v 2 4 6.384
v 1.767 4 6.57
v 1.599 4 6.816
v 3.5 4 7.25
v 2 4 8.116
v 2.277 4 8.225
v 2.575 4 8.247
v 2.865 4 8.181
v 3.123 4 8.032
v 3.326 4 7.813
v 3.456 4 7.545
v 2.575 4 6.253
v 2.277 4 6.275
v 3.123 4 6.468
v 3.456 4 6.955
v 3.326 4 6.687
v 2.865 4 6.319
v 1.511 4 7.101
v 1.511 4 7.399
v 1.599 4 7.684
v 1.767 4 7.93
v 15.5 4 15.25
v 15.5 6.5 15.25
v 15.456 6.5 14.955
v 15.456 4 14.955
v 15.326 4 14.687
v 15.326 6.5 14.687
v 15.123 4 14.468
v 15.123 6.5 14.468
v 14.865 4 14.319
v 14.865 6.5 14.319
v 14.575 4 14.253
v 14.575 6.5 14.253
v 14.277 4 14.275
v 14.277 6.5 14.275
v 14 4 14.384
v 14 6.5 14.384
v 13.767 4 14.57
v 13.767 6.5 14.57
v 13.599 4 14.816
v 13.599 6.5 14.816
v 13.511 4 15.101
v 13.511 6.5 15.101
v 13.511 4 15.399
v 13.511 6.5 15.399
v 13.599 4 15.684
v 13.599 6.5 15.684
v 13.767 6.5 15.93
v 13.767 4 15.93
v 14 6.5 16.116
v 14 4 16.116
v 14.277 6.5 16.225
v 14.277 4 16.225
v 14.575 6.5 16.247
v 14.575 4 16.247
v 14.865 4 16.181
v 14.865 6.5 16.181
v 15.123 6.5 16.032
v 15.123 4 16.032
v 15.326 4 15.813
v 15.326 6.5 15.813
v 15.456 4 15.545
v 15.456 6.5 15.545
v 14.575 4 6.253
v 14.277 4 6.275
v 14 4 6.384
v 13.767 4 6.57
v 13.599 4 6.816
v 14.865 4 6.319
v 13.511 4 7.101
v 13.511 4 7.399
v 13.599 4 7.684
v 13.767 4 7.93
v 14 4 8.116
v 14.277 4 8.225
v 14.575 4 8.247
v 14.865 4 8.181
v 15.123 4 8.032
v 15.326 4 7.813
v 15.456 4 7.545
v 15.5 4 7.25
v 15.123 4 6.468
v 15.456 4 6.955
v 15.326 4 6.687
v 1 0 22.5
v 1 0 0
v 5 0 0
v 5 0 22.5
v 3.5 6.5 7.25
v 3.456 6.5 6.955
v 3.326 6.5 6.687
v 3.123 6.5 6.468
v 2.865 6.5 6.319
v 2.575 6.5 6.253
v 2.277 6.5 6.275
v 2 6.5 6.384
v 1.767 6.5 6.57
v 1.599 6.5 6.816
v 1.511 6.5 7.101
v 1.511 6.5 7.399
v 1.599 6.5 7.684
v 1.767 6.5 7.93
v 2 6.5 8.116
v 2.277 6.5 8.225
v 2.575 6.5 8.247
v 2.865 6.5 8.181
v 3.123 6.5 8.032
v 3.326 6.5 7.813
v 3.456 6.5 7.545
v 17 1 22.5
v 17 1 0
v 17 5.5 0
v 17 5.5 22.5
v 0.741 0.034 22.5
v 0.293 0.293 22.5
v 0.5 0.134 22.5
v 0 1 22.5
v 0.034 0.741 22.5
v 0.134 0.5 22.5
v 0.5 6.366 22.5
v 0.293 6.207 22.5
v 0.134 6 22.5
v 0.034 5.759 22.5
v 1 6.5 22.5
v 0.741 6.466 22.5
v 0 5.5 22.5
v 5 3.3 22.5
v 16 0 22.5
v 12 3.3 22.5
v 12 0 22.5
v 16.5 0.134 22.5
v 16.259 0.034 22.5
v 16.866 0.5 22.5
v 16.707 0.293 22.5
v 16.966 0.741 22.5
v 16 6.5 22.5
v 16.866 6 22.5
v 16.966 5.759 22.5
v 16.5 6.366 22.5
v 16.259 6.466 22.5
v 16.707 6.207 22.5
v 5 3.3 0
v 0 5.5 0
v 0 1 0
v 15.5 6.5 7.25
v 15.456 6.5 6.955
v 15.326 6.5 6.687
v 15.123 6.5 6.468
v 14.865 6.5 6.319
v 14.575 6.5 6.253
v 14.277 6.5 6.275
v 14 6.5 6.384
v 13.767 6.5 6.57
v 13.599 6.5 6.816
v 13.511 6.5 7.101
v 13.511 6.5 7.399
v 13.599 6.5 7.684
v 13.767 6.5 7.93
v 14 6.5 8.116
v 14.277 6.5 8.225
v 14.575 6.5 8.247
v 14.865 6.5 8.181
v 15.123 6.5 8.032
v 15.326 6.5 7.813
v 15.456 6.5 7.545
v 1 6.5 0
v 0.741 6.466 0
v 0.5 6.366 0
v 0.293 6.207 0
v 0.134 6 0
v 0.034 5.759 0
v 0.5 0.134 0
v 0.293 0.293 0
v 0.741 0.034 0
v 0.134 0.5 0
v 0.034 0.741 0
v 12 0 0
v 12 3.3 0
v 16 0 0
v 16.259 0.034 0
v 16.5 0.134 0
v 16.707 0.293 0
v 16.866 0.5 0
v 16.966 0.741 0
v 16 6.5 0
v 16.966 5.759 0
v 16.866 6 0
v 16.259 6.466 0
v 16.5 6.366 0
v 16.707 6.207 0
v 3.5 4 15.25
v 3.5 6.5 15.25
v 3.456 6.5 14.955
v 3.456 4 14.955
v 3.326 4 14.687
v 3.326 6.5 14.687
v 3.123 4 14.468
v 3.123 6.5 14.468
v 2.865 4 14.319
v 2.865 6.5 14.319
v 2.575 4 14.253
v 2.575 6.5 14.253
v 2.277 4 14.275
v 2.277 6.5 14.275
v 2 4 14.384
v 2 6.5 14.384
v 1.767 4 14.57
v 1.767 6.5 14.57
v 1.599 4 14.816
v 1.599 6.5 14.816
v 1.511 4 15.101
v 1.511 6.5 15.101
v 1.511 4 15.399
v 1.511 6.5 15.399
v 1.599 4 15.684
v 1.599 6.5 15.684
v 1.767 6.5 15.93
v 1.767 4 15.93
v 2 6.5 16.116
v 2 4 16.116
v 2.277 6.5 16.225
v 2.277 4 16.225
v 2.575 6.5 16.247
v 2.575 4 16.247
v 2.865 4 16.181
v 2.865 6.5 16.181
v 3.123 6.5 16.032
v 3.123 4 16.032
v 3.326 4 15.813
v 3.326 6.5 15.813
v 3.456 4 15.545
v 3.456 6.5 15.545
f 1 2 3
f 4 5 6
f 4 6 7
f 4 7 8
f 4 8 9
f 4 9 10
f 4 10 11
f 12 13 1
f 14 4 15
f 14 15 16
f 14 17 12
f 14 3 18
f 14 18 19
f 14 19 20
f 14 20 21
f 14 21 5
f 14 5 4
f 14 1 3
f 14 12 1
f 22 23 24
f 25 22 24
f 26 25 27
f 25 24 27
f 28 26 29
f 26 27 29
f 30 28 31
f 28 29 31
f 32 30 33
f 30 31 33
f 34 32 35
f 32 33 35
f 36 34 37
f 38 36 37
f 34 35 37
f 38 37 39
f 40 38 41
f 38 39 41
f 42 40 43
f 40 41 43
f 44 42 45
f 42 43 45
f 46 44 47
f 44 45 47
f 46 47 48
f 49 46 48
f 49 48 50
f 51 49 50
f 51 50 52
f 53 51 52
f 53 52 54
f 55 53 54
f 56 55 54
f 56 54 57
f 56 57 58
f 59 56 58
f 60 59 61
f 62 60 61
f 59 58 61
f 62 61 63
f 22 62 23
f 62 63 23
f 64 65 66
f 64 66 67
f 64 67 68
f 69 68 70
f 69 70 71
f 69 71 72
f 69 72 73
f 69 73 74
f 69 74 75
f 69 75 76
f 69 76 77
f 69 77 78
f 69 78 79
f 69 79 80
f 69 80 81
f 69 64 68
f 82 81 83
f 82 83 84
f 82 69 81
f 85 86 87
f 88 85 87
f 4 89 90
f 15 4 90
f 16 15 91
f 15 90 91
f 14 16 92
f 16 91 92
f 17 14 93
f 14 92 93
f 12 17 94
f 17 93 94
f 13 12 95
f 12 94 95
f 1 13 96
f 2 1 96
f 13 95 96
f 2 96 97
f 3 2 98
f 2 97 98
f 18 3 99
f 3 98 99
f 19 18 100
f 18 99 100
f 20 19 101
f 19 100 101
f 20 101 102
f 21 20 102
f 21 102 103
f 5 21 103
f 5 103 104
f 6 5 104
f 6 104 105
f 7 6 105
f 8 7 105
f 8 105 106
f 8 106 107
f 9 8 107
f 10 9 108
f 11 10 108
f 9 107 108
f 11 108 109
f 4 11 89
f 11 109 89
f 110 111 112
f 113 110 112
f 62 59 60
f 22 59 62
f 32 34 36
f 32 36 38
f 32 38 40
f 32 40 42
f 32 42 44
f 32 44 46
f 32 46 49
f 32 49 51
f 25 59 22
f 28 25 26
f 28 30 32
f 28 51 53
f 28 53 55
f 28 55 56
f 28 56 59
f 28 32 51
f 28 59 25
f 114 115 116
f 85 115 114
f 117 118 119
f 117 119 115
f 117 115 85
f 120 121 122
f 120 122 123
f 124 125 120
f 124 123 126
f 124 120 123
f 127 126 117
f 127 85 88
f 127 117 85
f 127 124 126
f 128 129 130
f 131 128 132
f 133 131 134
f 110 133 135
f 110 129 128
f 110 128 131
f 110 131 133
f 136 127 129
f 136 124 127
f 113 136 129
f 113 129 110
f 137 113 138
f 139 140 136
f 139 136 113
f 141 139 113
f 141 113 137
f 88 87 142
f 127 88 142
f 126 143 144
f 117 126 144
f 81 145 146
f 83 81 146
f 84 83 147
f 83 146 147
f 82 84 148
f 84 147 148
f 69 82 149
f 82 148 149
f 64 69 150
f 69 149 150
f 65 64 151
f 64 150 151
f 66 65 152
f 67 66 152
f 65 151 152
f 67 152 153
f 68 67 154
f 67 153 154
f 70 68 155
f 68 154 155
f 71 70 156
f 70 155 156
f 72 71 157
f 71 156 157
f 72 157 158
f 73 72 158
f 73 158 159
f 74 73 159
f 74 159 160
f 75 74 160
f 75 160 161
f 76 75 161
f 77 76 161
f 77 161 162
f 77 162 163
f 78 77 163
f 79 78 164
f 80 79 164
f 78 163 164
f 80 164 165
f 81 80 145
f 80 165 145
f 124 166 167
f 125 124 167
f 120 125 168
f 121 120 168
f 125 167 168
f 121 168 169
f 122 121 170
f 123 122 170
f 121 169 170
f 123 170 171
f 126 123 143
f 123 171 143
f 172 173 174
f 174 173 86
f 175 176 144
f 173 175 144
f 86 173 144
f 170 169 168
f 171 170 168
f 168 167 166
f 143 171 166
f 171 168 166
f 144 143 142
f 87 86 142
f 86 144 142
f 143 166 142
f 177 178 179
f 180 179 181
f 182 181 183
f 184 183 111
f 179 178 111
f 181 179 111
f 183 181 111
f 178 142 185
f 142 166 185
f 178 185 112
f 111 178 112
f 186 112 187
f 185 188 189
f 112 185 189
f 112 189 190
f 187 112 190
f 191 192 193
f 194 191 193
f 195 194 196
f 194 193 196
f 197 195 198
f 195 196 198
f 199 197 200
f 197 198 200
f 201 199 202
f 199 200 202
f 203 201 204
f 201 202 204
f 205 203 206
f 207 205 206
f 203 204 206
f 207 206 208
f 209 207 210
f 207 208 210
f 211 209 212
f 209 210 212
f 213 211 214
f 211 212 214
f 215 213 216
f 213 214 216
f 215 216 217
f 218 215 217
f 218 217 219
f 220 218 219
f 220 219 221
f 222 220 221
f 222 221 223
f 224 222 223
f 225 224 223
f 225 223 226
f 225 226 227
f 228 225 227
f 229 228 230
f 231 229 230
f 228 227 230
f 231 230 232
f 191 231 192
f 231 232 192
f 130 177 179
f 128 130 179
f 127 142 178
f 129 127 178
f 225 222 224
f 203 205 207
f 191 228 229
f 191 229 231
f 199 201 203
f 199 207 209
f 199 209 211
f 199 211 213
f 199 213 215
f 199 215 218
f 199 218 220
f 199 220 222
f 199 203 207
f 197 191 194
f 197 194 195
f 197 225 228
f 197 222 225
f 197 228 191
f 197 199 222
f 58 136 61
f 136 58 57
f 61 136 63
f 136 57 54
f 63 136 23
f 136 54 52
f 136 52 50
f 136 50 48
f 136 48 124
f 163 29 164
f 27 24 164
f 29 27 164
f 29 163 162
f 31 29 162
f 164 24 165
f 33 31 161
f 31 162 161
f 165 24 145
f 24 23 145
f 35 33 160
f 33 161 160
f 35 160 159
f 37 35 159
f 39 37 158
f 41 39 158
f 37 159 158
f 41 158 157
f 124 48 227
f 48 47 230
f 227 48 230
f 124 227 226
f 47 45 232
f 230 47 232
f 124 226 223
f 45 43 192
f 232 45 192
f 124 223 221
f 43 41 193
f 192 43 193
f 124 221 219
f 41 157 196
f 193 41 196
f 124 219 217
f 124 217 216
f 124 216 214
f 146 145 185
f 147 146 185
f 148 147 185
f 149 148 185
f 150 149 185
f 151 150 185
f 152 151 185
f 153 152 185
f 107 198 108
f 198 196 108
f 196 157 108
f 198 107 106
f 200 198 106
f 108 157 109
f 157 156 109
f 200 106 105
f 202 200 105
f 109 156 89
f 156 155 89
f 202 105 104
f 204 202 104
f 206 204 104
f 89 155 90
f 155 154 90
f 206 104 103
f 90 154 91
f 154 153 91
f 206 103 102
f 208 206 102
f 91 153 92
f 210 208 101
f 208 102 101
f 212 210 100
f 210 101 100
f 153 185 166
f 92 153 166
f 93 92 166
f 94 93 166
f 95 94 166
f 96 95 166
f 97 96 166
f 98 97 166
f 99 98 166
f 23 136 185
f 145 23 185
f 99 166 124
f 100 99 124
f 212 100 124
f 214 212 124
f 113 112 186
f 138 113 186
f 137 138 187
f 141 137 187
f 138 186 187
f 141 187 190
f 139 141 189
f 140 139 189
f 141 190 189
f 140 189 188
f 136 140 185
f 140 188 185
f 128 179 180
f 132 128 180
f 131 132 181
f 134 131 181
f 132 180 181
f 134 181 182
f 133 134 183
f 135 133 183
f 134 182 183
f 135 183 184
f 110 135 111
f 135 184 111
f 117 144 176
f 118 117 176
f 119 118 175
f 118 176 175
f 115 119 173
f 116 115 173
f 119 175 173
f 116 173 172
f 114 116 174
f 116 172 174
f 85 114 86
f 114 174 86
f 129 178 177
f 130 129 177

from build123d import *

# Parameters (mm, degrees)
EXTRUDE_1_DEPTH     = 22.5
SKETCH_2_R          = 1
CUT_EXTRUDE_1_DEPTH = 2.5


with BuildPart() as part:
    # 草图1 → 凸台-拉伸1 (new body)
    with BuildSketch(Plane.XY):
        with BuildLine():
            Line((5, 3.3), (12, 3.3))
            Line((12, 3.3), (12, 0))
            Line((12, 0), (16, 0))
            ThreePointArc((16, 0), (16.707106781, 0.292893219), (17, 1))
            Line((17, 1), (17, 5.5))
            ThreePointArc((17, 5.5), (16.707106781, 6.207106781), (16, 6.5))
            Line((16, 6.5), (1, 6.5))
            ThreePointArc((1, 6.5), (0.292893219, 6.207106781), (0, 5.5))
            Line((0, 5.5), (0, 1))
            ThreePointArc((0, 1), (0.292893219, 0.292893219), (1, 0))
            Line((1, 0), (5, 0))
            Line((5, 0), (5, 3.3))
        make_face()
    extrude(amount=EXTRUDE_1_DEPTH)

    # 草图2 → 切除-拉伸1 (cut)
    with BuildSketch(Plane(origin=(0, 6.5, 0), x_dir=(1, 0, 0), z_dir=(0, 1, 0))):
        with Locations((2.5, -15.25)):
            Circle(SKETCH_2_R)
        with Locations((2.5, -7.25)):
            Circle(SKETCH_2_R)
        with Locations((14.5, -7.25)):
            Circle(SKETCH_2_R)
        with Locations((14.5, -15.25)):
            Circle(SKETCH_2_R)
    extrude(amount=-CUT_EXTRUDE_1_DEPTH, mode=Mode.SUBTRACT)


solid = part.part
